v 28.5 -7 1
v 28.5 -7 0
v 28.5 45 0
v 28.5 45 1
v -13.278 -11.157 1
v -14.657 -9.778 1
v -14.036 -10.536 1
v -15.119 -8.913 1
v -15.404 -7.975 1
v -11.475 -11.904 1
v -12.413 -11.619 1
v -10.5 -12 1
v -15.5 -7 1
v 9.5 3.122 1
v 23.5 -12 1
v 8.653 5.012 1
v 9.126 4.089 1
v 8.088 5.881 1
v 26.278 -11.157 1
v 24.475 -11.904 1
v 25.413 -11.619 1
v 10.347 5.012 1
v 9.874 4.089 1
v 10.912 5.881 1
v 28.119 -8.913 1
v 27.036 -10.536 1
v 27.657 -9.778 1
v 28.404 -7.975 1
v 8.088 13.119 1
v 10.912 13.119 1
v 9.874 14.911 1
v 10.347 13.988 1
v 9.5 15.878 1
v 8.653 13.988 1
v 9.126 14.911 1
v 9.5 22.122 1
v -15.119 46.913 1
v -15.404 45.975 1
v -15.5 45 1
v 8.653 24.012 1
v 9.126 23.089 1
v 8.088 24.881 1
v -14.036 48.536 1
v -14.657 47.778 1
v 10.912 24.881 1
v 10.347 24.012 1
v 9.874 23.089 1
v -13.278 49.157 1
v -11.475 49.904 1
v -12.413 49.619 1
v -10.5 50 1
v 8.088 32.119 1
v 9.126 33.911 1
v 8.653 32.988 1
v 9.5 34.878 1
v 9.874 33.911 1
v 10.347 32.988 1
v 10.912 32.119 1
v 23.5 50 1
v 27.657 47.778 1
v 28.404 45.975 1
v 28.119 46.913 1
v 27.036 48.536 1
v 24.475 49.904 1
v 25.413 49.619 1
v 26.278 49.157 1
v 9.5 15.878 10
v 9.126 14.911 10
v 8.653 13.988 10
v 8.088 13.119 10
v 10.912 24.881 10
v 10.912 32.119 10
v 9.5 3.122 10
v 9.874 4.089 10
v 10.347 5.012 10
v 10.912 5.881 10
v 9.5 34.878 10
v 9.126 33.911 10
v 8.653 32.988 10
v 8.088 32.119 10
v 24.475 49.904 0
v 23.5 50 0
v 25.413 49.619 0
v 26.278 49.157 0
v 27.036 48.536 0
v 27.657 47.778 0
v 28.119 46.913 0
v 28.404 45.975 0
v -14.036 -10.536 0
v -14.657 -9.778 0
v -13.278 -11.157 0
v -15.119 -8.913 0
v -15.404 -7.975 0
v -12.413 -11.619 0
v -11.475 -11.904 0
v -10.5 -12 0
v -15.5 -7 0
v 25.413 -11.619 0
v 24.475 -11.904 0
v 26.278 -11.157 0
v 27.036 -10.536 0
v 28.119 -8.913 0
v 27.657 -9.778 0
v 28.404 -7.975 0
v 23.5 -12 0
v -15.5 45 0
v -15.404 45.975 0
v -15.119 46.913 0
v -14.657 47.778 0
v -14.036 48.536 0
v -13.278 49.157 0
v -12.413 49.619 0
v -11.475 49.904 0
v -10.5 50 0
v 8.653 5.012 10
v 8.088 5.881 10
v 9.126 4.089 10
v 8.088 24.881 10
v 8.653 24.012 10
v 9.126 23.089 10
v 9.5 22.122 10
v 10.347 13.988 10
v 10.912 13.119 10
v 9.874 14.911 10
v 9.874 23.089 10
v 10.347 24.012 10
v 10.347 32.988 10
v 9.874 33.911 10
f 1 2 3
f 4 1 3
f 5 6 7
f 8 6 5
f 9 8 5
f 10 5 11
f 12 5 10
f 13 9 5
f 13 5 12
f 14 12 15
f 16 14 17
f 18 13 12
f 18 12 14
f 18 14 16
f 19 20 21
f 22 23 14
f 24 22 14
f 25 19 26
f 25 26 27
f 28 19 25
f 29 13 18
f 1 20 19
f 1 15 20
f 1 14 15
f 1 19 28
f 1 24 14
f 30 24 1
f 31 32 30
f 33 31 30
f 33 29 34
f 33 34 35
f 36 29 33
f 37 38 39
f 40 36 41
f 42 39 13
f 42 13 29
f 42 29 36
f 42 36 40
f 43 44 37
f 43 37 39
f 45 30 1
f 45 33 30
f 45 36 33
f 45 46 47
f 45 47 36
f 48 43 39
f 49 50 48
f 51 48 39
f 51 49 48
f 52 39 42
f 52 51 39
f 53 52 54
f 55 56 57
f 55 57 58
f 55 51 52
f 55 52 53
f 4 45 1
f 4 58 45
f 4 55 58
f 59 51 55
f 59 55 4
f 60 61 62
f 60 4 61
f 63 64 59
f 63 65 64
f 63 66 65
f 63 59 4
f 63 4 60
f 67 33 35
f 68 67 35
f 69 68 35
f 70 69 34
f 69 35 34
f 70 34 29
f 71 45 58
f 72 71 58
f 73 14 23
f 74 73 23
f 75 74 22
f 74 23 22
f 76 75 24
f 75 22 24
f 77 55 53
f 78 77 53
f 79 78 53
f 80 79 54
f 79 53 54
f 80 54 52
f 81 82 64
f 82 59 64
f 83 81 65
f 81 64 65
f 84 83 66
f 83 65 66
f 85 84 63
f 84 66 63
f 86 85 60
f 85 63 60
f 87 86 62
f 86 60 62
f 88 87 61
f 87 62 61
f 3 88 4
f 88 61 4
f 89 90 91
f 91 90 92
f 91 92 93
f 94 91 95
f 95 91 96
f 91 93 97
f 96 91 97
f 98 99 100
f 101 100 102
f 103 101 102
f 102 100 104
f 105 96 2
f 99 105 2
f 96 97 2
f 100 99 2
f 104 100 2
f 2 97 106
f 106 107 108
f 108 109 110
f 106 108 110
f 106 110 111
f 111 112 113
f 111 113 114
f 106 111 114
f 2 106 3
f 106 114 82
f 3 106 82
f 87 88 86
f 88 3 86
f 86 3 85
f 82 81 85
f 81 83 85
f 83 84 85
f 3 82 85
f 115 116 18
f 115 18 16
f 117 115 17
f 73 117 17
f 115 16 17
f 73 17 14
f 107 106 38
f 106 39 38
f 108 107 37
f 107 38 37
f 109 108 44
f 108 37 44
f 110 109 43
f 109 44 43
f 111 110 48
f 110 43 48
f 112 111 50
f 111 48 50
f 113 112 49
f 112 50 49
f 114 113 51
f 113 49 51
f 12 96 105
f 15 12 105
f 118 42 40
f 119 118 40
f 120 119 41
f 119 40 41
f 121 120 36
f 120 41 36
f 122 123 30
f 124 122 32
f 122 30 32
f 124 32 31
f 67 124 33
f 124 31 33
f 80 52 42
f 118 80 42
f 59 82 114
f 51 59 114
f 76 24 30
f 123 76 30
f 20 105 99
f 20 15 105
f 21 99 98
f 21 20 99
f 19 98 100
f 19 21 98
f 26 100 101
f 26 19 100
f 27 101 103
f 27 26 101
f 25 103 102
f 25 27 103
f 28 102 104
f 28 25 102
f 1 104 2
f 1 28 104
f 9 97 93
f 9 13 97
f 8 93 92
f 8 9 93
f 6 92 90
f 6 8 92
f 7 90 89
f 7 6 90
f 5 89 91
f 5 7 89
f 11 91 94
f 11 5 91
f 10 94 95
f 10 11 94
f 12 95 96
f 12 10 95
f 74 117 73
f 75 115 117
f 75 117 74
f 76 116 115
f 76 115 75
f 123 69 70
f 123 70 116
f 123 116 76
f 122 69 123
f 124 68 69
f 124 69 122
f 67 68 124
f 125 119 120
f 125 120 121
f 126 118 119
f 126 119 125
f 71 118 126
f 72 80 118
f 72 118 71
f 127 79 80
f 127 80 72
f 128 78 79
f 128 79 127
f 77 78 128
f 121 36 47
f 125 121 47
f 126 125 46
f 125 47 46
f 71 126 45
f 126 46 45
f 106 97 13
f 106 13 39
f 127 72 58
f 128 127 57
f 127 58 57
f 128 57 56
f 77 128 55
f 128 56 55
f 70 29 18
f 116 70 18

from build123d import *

# Parameters (mm, degrees)
F0_W     = 6
F0_H     = 62
F0_W_2   = 38
F1_DEPTH = 1
F2_DEPTH = 10
F3_R     = 5


# Not quite as in the source:
# - a feature names something its author has since deleted; it is built from what else it names


with BuildPart() as f1:
    # F0 (on Top) → F1 (new body)
    with BuildSketch(Plane.XY):
        with Locations((-12.5, 19)):
            Rectangle(F0_W, F0_H)
        with Locations((9.5, 19)):
            Rectangle(F0_W_2, F0_H)
        with BuildLine():
            ThreePointArc((9.5, 15.8775010008), (10.0985618966, 14.4432029131), (10.9121369044, 13.1189736826))
            Line((10.9121369044, 13.1189736826), (10.9121369044, 5.8810263174))
            ThreePointArc((10.9121369044, 5.8810263174), (10.0985618966, 4.5567970869), (9.5, 3.1224989992))
            ThreePointArc((9.5, 3.1224989992), (8.9014381034, 4.5567970869), (8.0878630956, 5.8810263174))
            Line((8.0878630956, 5.8810263174), (8.0878630956, 13.1189736826))
            ThreePointArc((8.0878630956, 13.1189736826), (8.9014381034, 14.4432029131), (9.5, 15.8775010008))
        make_face(mode=Mode.SUBTRACT)
        with BuildLine():
            Line((8.0878630956, 24.8810263174), (8.0878630956, 32.1189736826))
            ThreePointArc((8.0878630956, 32.1189736826), (8.9014381034, 33.4432029131), (9.5, 34.8775010008))
            ThreePointArc((9.5, 34.8775010008), (10.0985618966, 33.4432029131), (10.9121369044, 32.1189736826))
            Line((10.9121369044, 32.1189736826), (10.9121369044, 24.8810263174))
            ThreePointArc((10.9121369044, 24.8810263174), (10.0985618966, 23.5567970869), (9.5, 22.1224989992))
            ThreePointArc((9.5, 22.1224989992), (8.9014381034, 23.5567970869), (8.0878630956, 24.8810263174))
        make_face(mode=Mode.SUBTRACT)
    extrude(amount=F1_DEPTH)

    # F0 (on Top) → F2 (join)
    with BuildSketch(Plane.XY):
        with BuildLine():
            ThreePointArc((9.5, 34.8775010008), (8.9014381034, 33.4432029131), (8.0878630956, 32.1189736826))
            Line((8.0878630956, 32.1189736826), (8.0878630956, 24.8810263174))
            ThreePointArc((8.0878630956, 24.8810263174), (8.9014381034, 23.5567970869), (9.5, 22.1224989992))
            ThreePointArc((9.5, 22.1224989992), (10.0985618966, 23.5567970869), (10.9121369044, 24.8810263174))
            Line((10.9121369044, 24.8810263174), (10.9121369044, 32.1189736826))
            ThreePointArc((10.9121369044, 32.1189736826), (10.0985618966, 33.4432029131), (9.5, 34.8775010008))
        make_face()
        with BuildLine():
            Line((10.9121369044, 5.8810263174), (10.9121369044, 13.1189736826))
            ThreePointArc((10.9121369044, 13.1189736826), (10.0985618966, 14.4432029131), (9.5, 15.8775010008))
            ThreePointArc((9.5, 15.8775010008), (8.9014381034, 14.4432029131), (8.0878630956, 13.1189736826))
            Line((8.0878630956, 13.1189736826), (8.0878630956, 5.8810263174))
            ThreePointArc((8.0878630956, 5.8810263174), (8.9014381034, 4.5567970869), (9.5, 3.1224989992))
            ThreePointArc((9.5, 3.1224989992), (10.0985618966, 4.5567970869), (10.9121369044, 5.8810263174))
        make_face()
    extrude(amount=F2_DEPTH)

    # F3
    f3_edges = [f1.edges().sort_by_distance(p)[0] for p in [
        (-15.5, 50, 0.5),
        (28.5, 50, 0.5),
        (28.5, -12, 0.5),
        (-15.5, -12, 0.5),
    ]]
    fillet(f3_edges, radius=F3_R)


solid = f1.part
